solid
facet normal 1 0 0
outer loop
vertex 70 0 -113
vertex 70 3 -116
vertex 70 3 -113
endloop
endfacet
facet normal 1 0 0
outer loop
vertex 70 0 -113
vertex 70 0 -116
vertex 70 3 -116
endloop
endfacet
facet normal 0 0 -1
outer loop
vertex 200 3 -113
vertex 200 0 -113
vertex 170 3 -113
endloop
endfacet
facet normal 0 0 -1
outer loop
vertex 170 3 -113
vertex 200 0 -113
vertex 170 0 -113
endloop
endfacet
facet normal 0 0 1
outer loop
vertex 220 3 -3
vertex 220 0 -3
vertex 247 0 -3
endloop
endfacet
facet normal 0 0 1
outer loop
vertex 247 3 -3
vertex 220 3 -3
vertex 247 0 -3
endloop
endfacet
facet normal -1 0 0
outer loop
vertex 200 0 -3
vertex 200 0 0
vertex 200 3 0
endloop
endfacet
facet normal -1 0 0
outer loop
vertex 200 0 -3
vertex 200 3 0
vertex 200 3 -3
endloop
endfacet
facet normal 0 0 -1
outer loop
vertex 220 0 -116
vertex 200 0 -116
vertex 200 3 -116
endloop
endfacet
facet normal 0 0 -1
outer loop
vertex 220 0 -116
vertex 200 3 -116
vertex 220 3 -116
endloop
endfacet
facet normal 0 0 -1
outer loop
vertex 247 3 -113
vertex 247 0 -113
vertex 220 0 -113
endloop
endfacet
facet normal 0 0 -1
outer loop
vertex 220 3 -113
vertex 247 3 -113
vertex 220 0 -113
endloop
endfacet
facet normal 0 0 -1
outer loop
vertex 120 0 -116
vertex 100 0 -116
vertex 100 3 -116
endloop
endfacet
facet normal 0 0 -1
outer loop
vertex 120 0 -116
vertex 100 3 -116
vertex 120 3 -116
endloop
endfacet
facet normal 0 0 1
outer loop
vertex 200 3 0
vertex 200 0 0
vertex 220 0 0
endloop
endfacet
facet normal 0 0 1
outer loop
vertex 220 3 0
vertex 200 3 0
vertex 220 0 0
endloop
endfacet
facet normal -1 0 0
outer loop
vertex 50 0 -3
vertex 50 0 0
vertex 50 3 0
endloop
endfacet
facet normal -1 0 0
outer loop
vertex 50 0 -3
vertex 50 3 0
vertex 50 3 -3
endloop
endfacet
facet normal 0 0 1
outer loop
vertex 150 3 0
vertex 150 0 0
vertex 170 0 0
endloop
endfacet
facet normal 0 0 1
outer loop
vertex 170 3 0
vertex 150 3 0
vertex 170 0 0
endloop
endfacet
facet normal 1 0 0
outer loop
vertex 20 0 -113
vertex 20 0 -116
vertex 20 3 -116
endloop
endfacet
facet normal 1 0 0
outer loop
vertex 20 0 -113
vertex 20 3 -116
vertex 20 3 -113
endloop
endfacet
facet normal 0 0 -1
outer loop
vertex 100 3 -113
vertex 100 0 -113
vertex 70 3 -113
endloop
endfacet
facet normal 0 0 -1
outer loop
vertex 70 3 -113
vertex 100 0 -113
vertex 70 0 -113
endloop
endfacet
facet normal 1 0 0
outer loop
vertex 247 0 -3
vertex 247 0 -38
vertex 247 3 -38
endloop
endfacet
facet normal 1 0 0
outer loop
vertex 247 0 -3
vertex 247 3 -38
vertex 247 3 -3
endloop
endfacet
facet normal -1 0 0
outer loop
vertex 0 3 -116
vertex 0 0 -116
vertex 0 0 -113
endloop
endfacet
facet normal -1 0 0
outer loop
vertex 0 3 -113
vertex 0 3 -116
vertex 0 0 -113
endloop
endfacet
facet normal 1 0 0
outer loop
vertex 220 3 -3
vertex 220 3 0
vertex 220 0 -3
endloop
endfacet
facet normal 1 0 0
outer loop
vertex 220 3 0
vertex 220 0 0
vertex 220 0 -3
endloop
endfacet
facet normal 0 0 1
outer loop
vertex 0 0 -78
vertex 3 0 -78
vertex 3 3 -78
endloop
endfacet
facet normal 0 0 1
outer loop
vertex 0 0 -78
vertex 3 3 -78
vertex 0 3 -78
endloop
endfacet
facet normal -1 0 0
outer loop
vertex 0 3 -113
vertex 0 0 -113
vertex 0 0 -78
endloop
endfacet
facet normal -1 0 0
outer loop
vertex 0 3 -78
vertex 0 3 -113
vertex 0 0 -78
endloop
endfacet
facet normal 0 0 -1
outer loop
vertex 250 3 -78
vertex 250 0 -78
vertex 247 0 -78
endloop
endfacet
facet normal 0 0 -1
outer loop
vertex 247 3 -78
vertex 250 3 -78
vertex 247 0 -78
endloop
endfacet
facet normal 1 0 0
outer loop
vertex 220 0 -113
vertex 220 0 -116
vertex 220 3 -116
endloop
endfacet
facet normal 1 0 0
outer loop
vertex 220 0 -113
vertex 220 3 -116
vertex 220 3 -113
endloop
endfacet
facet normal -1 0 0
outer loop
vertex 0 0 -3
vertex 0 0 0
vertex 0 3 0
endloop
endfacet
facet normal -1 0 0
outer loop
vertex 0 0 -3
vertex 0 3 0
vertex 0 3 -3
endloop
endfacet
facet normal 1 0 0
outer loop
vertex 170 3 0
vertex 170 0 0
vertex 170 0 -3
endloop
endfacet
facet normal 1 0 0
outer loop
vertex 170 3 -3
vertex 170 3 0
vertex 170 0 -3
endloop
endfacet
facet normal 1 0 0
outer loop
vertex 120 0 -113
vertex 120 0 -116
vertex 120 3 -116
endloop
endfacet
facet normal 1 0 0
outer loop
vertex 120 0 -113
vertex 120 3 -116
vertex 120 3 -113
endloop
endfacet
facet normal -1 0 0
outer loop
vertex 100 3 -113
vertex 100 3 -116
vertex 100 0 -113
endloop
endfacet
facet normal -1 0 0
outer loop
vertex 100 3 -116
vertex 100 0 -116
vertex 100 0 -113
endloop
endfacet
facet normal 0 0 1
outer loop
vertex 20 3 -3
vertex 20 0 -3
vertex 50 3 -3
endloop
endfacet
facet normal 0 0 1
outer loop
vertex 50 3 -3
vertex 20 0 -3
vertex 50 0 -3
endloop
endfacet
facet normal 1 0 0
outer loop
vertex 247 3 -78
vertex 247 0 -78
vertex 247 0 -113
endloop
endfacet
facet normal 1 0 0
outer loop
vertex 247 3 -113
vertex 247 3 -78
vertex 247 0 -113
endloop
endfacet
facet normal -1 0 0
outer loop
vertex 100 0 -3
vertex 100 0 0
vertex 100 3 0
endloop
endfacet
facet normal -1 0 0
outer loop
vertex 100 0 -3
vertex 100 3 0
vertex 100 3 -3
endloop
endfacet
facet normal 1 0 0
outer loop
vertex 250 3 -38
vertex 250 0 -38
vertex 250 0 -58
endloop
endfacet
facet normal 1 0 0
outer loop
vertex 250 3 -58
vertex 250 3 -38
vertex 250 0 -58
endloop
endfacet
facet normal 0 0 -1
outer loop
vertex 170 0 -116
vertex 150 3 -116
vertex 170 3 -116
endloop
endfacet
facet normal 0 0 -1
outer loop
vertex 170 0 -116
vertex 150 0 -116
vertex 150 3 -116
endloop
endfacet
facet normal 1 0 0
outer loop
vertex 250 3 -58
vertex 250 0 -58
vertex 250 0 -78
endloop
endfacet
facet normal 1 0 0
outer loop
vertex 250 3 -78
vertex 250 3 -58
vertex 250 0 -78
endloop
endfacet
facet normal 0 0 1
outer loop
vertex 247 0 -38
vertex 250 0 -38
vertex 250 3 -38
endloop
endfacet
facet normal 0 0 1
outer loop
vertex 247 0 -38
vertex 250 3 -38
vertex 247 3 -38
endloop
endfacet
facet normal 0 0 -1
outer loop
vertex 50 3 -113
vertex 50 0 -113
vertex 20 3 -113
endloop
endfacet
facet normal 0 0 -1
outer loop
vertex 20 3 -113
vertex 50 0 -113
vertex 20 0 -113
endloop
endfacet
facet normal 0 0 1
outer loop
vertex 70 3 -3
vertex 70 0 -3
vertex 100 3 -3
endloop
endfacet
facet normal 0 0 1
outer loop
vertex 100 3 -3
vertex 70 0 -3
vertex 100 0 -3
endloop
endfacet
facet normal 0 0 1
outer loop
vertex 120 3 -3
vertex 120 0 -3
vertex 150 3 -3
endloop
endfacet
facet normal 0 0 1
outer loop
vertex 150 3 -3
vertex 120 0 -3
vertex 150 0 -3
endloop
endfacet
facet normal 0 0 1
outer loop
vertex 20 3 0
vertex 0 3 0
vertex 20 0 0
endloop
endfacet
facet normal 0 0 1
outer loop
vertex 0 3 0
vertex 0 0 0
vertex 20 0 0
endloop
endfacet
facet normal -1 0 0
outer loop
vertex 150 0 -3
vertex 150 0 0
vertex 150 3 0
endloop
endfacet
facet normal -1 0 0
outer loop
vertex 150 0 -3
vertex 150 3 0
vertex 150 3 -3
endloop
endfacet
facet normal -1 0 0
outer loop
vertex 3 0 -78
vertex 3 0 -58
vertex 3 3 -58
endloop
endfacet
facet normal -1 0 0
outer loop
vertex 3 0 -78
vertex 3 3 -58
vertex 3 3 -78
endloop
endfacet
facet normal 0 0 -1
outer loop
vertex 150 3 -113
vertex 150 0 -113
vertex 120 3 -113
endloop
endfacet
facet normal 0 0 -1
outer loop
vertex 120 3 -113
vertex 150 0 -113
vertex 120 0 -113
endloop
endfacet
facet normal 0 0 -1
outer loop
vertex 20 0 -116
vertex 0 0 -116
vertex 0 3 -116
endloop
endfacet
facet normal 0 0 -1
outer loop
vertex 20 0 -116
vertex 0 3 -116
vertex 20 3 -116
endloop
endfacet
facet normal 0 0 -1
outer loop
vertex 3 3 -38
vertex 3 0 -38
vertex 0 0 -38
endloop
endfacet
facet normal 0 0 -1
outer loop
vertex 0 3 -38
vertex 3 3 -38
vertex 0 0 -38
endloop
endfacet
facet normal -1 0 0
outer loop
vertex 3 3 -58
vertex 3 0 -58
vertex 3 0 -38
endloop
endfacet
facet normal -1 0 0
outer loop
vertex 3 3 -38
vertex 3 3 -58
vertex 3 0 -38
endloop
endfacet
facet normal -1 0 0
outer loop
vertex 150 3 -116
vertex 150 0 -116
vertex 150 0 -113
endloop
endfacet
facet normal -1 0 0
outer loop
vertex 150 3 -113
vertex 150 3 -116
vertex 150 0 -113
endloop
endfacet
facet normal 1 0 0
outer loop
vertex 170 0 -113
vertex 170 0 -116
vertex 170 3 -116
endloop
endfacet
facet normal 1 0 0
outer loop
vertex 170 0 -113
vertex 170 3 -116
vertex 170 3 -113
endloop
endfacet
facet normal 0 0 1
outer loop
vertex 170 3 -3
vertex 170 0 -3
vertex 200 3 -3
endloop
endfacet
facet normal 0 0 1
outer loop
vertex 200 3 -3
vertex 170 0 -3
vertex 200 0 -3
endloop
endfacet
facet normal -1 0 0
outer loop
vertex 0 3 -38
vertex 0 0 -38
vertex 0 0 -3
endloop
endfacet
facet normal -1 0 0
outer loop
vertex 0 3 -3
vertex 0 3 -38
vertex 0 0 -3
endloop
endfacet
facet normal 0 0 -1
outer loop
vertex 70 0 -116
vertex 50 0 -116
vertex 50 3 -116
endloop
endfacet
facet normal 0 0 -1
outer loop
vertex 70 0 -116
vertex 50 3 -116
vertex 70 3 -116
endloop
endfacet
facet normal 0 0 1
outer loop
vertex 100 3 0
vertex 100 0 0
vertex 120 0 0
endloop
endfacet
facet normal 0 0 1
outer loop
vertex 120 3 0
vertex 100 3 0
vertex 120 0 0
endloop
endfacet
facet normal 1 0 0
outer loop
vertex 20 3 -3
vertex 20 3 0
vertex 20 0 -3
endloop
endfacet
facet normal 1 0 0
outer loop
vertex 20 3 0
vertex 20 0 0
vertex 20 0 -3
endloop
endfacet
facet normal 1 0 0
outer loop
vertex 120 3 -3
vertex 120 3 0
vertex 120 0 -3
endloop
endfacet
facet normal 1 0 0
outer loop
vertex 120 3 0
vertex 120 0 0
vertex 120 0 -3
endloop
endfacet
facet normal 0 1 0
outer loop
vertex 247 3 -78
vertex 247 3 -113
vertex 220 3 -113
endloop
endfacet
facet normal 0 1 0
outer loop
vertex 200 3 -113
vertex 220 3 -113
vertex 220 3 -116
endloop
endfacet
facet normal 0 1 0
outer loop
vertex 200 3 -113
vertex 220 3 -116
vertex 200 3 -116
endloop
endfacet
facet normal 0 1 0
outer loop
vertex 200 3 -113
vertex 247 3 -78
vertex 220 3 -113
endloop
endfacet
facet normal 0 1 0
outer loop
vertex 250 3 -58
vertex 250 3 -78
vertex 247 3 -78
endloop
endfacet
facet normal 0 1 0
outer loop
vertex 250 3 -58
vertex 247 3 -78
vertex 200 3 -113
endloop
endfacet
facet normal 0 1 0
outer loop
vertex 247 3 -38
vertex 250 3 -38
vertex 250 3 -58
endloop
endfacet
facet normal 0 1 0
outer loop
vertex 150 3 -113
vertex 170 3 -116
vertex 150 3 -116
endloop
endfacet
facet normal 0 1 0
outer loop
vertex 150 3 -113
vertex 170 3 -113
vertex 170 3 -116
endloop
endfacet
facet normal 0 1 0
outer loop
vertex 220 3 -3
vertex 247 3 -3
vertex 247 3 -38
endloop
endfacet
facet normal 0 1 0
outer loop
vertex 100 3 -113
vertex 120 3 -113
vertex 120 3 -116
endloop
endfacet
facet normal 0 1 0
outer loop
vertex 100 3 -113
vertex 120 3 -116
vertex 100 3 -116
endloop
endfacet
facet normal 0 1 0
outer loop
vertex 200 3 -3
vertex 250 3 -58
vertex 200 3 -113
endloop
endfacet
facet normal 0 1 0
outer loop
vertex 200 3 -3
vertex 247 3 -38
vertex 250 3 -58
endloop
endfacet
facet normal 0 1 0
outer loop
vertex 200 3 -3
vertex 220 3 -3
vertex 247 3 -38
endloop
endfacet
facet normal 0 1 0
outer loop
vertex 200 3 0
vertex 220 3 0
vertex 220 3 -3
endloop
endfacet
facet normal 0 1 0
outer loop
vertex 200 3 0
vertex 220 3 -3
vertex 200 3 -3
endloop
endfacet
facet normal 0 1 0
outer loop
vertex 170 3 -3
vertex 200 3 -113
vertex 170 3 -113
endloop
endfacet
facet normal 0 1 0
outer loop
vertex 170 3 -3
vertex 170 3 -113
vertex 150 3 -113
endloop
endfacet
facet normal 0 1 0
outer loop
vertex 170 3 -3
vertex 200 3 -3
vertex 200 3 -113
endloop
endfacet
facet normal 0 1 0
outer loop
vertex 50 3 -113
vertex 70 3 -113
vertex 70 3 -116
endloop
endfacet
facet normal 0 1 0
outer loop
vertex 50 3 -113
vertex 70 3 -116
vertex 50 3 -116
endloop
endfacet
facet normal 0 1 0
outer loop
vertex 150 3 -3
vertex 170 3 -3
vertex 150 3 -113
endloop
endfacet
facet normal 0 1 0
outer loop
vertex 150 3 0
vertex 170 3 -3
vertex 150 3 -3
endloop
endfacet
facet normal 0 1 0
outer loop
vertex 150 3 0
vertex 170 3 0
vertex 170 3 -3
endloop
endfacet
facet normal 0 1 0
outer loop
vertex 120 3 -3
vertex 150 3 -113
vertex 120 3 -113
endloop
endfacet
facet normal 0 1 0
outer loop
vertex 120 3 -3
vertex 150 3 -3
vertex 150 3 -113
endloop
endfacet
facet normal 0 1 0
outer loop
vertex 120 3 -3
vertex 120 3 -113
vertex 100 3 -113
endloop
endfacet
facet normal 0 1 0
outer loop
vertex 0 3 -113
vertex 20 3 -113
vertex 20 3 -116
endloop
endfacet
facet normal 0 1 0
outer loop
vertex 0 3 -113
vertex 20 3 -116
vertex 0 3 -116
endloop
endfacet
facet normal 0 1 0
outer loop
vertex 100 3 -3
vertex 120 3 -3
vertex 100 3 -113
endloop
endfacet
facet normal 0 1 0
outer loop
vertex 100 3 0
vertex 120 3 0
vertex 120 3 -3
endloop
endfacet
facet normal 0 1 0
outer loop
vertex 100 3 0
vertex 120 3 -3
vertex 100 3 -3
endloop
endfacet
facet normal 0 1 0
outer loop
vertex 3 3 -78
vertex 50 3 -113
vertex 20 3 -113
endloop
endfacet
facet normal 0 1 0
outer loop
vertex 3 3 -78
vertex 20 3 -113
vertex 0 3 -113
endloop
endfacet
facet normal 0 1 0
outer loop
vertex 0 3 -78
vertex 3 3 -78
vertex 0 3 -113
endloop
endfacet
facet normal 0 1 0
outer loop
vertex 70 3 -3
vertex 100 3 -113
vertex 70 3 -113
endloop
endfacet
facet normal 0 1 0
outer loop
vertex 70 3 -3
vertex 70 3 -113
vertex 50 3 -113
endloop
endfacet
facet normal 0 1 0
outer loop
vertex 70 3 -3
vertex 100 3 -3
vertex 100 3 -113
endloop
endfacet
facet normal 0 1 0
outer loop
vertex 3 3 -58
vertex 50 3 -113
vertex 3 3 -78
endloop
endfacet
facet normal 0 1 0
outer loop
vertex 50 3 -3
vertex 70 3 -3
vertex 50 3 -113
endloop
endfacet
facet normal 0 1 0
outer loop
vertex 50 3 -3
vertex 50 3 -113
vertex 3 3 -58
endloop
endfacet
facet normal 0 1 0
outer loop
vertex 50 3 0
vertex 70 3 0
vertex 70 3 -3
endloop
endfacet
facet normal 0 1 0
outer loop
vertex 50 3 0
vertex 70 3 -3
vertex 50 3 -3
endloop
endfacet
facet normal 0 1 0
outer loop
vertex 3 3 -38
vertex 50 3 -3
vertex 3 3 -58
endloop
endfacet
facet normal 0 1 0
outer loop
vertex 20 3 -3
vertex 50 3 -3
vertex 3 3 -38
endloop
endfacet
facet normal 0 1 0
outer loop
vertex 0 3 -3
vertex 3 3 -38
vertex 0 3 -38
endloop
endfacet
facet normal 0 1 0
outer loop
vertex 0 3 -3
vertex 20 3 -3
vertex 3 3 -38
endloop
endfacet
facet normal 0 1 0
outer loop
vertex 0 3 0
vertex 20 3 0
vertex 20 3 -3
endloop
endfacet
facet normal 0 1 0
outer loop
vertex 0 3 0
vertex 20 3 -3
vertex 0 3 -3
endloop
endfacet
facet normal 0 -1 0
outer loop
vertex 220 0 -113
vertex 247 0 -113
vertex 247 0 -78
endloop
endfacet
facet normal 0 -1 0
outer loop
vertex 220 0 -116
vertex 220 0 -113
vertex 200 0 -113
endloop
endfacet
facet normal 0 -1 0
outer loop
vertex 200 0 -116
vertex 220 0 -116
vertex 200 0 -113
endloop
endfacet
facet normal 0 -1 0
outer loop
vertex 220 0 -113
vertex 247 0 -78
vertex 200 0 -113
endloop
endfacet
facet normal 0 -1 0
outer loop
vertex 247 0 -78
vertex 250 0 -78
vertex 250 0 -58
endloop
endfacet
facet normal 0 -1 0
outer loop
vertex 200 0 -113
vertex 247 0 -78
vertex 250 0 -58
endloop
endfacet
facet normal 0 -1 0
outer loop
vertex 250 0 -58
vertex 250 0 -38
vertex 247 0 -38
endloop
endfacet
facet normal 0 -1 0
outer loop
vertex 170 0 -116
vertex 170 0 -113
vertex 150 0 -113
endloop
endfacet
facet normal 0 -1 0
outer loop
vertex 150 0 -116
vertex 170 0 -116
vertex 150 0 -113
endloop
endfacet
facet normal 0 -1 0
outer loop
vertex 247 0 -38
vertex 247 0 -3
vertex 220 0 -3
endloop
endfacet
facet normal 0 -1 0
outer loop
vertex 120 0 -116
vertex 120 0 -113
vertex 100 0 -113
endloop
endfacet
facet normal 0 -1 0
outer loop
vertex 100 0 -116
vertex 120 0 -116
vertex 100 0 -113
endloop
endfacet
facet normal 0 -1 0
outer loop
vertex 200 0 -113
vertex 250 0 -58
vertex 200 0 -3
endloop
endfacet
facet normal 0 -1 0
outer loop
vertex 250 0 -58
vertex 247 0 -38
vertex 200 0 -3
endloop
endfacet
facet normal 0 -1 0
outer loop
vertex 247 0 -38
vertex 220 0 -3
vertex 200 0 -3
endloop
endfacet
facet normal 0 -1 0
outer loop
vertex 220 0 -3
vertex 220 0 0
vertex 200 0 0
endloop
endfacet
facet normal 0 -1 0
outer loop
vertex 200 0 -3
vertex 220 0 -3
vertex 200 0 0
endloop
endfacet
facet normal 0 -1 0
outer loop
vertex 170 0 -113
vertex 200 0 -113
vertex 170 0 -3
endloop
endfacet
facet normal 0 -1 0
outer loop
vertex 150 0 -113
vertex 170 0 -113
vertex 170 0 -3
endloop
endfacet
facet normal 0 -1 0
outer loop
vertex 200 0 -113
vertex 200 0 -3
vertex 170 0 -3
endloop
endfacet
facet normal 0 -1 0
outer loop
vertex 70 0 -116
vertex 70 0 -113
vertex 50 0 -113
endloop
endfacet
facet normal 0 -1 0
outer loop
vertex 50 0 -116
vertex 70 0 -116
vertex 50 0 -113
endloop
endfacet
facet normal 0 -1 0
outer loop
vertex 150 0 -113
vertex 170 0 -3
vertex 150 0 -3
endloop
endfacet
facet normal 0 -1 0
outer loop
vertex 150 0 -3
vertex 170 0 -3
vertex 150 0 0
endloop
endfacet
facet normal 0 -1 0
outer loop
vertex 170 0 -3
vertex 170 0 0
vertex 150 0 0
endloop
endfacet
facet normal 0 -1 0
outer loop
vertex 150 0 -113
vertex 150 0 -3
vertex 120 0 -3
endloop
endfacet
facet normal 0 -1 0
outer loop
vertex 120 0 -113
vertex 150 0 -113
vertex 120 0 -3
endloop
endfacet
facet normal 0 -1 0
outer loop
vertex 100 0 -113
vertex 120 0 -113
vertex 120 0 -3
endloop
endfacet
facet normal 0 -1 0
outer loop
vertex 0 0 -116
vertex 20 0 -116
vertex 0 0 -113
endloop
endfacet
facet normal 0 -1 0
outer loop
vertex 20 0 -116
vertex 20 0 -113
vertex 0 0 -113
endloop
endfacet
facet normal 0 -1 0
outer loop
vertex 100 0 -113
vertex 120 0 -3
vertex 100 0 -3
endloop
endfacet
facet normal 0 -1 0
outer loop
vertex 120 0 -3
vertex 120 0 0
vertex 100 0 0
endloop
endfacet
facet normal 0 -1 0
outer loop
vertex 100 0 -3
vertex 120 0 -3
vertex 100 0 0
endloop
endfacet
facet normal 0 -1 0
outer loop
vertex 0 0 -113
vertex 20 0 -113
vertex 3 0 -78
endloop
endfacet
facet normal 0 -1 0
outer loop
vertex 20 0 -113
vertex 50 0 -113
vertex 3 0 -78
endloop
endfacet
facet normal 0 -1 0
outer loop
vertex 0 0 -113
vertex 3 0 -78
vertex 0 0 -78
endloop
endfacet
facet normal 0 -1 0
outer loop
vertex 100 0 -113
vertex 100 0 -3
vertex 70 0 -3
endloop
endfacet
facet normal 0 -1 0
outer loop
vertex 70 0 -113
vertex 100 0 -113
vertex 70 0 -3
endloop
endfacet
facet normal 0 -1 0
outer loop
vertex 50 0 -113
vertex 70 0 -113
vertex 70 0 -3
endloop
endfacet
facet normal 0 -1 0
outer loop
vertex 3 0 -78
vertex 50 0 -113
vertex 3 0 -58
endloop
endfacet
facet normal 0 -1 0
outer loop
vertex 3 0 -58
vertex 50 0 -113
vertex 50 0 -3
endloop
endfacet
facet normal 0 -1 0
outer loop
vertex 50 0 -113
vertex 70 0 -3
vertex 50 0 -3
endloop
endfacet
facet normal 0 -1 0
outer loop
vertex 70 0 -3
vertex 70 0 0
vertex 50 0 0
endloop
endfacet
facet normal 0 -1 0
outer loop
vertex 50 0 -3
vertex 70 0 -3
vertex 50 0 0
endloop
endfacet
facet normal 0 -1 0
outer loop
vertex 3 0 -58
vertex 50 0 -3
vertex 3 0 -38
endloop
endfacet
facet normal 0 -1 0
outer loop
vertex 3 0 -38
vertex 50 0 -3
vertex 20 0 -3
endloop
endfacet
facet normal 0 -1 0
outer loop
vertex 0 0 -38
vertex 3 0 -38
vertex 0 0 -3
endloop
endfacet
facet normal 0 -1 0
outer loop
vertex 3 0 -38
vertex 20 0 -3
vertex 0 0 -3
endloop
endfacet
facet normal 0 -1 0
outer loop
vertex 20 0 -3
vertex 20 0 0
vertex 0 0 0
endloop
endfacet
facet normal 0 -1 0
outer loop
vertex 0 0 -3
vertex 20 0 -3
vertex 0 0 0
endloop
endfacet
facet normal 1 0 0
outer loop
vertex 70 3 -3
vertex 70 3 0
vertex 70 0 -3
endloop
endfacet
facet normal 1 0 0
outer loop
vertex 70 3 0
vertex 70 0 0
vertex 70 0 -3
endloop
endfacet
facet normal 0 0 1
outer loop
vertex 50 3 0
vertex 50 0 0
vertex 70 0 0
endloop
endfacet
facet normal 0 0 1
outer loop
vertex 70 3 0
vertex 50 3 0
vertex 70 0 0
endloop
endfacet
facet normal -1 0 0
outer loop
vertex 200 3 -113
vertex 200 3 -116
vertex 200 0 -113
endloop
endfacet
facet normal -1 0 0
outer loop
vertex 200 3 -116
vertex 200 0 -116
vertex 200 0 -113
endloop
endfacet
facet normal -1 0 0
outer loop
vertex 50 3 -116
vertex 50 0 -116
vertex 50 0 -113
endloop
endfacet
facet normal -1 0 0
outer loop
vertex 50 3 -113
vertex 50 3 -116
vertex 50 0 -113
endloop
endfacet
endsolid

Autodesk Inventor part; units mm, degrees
ref_plane "YZ Plane" through (0, 0, 0) normal (1, 0, 0) x (0, 1, 0)
ref_plane "XZ Plane" through (0, 0, 0) normal (0, 1, 0) x (-1, 0, 0)
ref_plane "XY Plane" through (0, 0, 0) normal (0, 0, 1) x (1, 0, 0)
sketch "Sketch1" plane through (0, 0, 0) normal (0, 1, 0) x (-1, 0, 0)
  line L0 (0, 0) -> (0, -3)
  line L1 (-250, -38) -> (-250, -78)
  line L2 (0, 0) -> (-20, 0)
  line L3 (-50, 0) -> (-50, -3)
  line L4 (-50, 0) -> (-70, 0)
  line L5 (-70, 0) -> (-70, -3)
  line L6 (-100, 0) -> (-100, -3)
  line L7 (-100, 0) -> (-120, 0)
  line L8 (-120, 0) -> (-120, -3)
  line L9 (-150, 0) -> (-150, -3)
  line L10 (-150, 0) -> (-170, 0)
  line L11 (-170, 0) -> (-170, -3)
  line L12 (-200, 0) -> (-200, -3)
  line L13 (-200, 0) -> (-220, 0)
  line L14 (-220, 0) -> (-220, -3)
  line L15 (-20, 0) -> (-20, -3)
  line L16 (-250, -58) -> (-250, -78)
  line L17 (-250, -78) -> (-247, -78)
  line L18 (-247, -78) -> (-247, -113)
  line L19 (-250, -58) -> (-250, -38)
  line L20 (-250, -38) -> (-247, -38)
  line L21 (-247, -38) -> (-247, -3)
  line L22 (-220, -3) -> (-247, -3)
  line L23 (-170, -3) -> (-200, -3)
  line L24 (-120, -3) -> (-150, -3)
  line L25 (-20, -3) -> (-50, -3)
  line L26 (-70, -3) -> (-100, -3)
  line L27 (0, -116) -> (0, -113)
  line L28 (0, -116) -> (-20, -116)
  line L29 (-50, -116) -> (-50, -113)
  line L30 (-50, -116) -> (-70, -116)
  line L31 (-70, -116) -> (-70, -113)
  line L32 (-100, -116) -> (-100, -113)
  line L33 (-100, -116) -> (-120, -116)
  line L34 (-120, -116) -> (-120, -113)
  line L35 (-150, -116) -> (-150, -113)
  line L36 (-150, -116) -> (-170, -116)
  line L37 (-170, -116) -> (-170, -113)
  line L38 (-200, -116) -> (-200, -113)
  line L39 (-200, -116) -> (-220, -116)
  line L40 (-220, -116) -> (-220, -113)
  line L41 (-20, -116) -> (-20, -113)
  line L42 (-3, -58) -> (-3, -78)
  line L43 (-3, -78) -> (0, -78)
  line L44 (-3, -58) -> (-3, -38)
  line L45 (-3, -38) -> (0, -38)
  line L46 (0, -113) -> (0, -78)
  line L47 (0, -38) -> (0, -3)
  line L48 (-50, -113) -> (-20, -113)
  line L49 (-100, -113) -> (-70, -113)
  line L50 (-150, -113) -> (-120, -113)
  line L51 (-247, -113) -> (-220, -113)
  line L52 (-200, -113) -> (-170, -113)
  dimension "d2" = 110
  dimension "d3" = 20
  dimension "d4" = 20
  dimension "d5" = 20
  dimension "d7" = 20
  dimension "d8" = 20
  dimension "d9" = 20
  dimension "d10" = 3
  dimension "d11" = 20
  dimension "d12" = 3
  dimension "d13" = 250
  dimension "d14" = 30
  dimension "d15" = 30
  dimension "d16" = 30
  dimension "d17" = 30
extrude "Extrusion1" add sketch "Sketch1" along normal blind 3
properties part number "latGenerico"
